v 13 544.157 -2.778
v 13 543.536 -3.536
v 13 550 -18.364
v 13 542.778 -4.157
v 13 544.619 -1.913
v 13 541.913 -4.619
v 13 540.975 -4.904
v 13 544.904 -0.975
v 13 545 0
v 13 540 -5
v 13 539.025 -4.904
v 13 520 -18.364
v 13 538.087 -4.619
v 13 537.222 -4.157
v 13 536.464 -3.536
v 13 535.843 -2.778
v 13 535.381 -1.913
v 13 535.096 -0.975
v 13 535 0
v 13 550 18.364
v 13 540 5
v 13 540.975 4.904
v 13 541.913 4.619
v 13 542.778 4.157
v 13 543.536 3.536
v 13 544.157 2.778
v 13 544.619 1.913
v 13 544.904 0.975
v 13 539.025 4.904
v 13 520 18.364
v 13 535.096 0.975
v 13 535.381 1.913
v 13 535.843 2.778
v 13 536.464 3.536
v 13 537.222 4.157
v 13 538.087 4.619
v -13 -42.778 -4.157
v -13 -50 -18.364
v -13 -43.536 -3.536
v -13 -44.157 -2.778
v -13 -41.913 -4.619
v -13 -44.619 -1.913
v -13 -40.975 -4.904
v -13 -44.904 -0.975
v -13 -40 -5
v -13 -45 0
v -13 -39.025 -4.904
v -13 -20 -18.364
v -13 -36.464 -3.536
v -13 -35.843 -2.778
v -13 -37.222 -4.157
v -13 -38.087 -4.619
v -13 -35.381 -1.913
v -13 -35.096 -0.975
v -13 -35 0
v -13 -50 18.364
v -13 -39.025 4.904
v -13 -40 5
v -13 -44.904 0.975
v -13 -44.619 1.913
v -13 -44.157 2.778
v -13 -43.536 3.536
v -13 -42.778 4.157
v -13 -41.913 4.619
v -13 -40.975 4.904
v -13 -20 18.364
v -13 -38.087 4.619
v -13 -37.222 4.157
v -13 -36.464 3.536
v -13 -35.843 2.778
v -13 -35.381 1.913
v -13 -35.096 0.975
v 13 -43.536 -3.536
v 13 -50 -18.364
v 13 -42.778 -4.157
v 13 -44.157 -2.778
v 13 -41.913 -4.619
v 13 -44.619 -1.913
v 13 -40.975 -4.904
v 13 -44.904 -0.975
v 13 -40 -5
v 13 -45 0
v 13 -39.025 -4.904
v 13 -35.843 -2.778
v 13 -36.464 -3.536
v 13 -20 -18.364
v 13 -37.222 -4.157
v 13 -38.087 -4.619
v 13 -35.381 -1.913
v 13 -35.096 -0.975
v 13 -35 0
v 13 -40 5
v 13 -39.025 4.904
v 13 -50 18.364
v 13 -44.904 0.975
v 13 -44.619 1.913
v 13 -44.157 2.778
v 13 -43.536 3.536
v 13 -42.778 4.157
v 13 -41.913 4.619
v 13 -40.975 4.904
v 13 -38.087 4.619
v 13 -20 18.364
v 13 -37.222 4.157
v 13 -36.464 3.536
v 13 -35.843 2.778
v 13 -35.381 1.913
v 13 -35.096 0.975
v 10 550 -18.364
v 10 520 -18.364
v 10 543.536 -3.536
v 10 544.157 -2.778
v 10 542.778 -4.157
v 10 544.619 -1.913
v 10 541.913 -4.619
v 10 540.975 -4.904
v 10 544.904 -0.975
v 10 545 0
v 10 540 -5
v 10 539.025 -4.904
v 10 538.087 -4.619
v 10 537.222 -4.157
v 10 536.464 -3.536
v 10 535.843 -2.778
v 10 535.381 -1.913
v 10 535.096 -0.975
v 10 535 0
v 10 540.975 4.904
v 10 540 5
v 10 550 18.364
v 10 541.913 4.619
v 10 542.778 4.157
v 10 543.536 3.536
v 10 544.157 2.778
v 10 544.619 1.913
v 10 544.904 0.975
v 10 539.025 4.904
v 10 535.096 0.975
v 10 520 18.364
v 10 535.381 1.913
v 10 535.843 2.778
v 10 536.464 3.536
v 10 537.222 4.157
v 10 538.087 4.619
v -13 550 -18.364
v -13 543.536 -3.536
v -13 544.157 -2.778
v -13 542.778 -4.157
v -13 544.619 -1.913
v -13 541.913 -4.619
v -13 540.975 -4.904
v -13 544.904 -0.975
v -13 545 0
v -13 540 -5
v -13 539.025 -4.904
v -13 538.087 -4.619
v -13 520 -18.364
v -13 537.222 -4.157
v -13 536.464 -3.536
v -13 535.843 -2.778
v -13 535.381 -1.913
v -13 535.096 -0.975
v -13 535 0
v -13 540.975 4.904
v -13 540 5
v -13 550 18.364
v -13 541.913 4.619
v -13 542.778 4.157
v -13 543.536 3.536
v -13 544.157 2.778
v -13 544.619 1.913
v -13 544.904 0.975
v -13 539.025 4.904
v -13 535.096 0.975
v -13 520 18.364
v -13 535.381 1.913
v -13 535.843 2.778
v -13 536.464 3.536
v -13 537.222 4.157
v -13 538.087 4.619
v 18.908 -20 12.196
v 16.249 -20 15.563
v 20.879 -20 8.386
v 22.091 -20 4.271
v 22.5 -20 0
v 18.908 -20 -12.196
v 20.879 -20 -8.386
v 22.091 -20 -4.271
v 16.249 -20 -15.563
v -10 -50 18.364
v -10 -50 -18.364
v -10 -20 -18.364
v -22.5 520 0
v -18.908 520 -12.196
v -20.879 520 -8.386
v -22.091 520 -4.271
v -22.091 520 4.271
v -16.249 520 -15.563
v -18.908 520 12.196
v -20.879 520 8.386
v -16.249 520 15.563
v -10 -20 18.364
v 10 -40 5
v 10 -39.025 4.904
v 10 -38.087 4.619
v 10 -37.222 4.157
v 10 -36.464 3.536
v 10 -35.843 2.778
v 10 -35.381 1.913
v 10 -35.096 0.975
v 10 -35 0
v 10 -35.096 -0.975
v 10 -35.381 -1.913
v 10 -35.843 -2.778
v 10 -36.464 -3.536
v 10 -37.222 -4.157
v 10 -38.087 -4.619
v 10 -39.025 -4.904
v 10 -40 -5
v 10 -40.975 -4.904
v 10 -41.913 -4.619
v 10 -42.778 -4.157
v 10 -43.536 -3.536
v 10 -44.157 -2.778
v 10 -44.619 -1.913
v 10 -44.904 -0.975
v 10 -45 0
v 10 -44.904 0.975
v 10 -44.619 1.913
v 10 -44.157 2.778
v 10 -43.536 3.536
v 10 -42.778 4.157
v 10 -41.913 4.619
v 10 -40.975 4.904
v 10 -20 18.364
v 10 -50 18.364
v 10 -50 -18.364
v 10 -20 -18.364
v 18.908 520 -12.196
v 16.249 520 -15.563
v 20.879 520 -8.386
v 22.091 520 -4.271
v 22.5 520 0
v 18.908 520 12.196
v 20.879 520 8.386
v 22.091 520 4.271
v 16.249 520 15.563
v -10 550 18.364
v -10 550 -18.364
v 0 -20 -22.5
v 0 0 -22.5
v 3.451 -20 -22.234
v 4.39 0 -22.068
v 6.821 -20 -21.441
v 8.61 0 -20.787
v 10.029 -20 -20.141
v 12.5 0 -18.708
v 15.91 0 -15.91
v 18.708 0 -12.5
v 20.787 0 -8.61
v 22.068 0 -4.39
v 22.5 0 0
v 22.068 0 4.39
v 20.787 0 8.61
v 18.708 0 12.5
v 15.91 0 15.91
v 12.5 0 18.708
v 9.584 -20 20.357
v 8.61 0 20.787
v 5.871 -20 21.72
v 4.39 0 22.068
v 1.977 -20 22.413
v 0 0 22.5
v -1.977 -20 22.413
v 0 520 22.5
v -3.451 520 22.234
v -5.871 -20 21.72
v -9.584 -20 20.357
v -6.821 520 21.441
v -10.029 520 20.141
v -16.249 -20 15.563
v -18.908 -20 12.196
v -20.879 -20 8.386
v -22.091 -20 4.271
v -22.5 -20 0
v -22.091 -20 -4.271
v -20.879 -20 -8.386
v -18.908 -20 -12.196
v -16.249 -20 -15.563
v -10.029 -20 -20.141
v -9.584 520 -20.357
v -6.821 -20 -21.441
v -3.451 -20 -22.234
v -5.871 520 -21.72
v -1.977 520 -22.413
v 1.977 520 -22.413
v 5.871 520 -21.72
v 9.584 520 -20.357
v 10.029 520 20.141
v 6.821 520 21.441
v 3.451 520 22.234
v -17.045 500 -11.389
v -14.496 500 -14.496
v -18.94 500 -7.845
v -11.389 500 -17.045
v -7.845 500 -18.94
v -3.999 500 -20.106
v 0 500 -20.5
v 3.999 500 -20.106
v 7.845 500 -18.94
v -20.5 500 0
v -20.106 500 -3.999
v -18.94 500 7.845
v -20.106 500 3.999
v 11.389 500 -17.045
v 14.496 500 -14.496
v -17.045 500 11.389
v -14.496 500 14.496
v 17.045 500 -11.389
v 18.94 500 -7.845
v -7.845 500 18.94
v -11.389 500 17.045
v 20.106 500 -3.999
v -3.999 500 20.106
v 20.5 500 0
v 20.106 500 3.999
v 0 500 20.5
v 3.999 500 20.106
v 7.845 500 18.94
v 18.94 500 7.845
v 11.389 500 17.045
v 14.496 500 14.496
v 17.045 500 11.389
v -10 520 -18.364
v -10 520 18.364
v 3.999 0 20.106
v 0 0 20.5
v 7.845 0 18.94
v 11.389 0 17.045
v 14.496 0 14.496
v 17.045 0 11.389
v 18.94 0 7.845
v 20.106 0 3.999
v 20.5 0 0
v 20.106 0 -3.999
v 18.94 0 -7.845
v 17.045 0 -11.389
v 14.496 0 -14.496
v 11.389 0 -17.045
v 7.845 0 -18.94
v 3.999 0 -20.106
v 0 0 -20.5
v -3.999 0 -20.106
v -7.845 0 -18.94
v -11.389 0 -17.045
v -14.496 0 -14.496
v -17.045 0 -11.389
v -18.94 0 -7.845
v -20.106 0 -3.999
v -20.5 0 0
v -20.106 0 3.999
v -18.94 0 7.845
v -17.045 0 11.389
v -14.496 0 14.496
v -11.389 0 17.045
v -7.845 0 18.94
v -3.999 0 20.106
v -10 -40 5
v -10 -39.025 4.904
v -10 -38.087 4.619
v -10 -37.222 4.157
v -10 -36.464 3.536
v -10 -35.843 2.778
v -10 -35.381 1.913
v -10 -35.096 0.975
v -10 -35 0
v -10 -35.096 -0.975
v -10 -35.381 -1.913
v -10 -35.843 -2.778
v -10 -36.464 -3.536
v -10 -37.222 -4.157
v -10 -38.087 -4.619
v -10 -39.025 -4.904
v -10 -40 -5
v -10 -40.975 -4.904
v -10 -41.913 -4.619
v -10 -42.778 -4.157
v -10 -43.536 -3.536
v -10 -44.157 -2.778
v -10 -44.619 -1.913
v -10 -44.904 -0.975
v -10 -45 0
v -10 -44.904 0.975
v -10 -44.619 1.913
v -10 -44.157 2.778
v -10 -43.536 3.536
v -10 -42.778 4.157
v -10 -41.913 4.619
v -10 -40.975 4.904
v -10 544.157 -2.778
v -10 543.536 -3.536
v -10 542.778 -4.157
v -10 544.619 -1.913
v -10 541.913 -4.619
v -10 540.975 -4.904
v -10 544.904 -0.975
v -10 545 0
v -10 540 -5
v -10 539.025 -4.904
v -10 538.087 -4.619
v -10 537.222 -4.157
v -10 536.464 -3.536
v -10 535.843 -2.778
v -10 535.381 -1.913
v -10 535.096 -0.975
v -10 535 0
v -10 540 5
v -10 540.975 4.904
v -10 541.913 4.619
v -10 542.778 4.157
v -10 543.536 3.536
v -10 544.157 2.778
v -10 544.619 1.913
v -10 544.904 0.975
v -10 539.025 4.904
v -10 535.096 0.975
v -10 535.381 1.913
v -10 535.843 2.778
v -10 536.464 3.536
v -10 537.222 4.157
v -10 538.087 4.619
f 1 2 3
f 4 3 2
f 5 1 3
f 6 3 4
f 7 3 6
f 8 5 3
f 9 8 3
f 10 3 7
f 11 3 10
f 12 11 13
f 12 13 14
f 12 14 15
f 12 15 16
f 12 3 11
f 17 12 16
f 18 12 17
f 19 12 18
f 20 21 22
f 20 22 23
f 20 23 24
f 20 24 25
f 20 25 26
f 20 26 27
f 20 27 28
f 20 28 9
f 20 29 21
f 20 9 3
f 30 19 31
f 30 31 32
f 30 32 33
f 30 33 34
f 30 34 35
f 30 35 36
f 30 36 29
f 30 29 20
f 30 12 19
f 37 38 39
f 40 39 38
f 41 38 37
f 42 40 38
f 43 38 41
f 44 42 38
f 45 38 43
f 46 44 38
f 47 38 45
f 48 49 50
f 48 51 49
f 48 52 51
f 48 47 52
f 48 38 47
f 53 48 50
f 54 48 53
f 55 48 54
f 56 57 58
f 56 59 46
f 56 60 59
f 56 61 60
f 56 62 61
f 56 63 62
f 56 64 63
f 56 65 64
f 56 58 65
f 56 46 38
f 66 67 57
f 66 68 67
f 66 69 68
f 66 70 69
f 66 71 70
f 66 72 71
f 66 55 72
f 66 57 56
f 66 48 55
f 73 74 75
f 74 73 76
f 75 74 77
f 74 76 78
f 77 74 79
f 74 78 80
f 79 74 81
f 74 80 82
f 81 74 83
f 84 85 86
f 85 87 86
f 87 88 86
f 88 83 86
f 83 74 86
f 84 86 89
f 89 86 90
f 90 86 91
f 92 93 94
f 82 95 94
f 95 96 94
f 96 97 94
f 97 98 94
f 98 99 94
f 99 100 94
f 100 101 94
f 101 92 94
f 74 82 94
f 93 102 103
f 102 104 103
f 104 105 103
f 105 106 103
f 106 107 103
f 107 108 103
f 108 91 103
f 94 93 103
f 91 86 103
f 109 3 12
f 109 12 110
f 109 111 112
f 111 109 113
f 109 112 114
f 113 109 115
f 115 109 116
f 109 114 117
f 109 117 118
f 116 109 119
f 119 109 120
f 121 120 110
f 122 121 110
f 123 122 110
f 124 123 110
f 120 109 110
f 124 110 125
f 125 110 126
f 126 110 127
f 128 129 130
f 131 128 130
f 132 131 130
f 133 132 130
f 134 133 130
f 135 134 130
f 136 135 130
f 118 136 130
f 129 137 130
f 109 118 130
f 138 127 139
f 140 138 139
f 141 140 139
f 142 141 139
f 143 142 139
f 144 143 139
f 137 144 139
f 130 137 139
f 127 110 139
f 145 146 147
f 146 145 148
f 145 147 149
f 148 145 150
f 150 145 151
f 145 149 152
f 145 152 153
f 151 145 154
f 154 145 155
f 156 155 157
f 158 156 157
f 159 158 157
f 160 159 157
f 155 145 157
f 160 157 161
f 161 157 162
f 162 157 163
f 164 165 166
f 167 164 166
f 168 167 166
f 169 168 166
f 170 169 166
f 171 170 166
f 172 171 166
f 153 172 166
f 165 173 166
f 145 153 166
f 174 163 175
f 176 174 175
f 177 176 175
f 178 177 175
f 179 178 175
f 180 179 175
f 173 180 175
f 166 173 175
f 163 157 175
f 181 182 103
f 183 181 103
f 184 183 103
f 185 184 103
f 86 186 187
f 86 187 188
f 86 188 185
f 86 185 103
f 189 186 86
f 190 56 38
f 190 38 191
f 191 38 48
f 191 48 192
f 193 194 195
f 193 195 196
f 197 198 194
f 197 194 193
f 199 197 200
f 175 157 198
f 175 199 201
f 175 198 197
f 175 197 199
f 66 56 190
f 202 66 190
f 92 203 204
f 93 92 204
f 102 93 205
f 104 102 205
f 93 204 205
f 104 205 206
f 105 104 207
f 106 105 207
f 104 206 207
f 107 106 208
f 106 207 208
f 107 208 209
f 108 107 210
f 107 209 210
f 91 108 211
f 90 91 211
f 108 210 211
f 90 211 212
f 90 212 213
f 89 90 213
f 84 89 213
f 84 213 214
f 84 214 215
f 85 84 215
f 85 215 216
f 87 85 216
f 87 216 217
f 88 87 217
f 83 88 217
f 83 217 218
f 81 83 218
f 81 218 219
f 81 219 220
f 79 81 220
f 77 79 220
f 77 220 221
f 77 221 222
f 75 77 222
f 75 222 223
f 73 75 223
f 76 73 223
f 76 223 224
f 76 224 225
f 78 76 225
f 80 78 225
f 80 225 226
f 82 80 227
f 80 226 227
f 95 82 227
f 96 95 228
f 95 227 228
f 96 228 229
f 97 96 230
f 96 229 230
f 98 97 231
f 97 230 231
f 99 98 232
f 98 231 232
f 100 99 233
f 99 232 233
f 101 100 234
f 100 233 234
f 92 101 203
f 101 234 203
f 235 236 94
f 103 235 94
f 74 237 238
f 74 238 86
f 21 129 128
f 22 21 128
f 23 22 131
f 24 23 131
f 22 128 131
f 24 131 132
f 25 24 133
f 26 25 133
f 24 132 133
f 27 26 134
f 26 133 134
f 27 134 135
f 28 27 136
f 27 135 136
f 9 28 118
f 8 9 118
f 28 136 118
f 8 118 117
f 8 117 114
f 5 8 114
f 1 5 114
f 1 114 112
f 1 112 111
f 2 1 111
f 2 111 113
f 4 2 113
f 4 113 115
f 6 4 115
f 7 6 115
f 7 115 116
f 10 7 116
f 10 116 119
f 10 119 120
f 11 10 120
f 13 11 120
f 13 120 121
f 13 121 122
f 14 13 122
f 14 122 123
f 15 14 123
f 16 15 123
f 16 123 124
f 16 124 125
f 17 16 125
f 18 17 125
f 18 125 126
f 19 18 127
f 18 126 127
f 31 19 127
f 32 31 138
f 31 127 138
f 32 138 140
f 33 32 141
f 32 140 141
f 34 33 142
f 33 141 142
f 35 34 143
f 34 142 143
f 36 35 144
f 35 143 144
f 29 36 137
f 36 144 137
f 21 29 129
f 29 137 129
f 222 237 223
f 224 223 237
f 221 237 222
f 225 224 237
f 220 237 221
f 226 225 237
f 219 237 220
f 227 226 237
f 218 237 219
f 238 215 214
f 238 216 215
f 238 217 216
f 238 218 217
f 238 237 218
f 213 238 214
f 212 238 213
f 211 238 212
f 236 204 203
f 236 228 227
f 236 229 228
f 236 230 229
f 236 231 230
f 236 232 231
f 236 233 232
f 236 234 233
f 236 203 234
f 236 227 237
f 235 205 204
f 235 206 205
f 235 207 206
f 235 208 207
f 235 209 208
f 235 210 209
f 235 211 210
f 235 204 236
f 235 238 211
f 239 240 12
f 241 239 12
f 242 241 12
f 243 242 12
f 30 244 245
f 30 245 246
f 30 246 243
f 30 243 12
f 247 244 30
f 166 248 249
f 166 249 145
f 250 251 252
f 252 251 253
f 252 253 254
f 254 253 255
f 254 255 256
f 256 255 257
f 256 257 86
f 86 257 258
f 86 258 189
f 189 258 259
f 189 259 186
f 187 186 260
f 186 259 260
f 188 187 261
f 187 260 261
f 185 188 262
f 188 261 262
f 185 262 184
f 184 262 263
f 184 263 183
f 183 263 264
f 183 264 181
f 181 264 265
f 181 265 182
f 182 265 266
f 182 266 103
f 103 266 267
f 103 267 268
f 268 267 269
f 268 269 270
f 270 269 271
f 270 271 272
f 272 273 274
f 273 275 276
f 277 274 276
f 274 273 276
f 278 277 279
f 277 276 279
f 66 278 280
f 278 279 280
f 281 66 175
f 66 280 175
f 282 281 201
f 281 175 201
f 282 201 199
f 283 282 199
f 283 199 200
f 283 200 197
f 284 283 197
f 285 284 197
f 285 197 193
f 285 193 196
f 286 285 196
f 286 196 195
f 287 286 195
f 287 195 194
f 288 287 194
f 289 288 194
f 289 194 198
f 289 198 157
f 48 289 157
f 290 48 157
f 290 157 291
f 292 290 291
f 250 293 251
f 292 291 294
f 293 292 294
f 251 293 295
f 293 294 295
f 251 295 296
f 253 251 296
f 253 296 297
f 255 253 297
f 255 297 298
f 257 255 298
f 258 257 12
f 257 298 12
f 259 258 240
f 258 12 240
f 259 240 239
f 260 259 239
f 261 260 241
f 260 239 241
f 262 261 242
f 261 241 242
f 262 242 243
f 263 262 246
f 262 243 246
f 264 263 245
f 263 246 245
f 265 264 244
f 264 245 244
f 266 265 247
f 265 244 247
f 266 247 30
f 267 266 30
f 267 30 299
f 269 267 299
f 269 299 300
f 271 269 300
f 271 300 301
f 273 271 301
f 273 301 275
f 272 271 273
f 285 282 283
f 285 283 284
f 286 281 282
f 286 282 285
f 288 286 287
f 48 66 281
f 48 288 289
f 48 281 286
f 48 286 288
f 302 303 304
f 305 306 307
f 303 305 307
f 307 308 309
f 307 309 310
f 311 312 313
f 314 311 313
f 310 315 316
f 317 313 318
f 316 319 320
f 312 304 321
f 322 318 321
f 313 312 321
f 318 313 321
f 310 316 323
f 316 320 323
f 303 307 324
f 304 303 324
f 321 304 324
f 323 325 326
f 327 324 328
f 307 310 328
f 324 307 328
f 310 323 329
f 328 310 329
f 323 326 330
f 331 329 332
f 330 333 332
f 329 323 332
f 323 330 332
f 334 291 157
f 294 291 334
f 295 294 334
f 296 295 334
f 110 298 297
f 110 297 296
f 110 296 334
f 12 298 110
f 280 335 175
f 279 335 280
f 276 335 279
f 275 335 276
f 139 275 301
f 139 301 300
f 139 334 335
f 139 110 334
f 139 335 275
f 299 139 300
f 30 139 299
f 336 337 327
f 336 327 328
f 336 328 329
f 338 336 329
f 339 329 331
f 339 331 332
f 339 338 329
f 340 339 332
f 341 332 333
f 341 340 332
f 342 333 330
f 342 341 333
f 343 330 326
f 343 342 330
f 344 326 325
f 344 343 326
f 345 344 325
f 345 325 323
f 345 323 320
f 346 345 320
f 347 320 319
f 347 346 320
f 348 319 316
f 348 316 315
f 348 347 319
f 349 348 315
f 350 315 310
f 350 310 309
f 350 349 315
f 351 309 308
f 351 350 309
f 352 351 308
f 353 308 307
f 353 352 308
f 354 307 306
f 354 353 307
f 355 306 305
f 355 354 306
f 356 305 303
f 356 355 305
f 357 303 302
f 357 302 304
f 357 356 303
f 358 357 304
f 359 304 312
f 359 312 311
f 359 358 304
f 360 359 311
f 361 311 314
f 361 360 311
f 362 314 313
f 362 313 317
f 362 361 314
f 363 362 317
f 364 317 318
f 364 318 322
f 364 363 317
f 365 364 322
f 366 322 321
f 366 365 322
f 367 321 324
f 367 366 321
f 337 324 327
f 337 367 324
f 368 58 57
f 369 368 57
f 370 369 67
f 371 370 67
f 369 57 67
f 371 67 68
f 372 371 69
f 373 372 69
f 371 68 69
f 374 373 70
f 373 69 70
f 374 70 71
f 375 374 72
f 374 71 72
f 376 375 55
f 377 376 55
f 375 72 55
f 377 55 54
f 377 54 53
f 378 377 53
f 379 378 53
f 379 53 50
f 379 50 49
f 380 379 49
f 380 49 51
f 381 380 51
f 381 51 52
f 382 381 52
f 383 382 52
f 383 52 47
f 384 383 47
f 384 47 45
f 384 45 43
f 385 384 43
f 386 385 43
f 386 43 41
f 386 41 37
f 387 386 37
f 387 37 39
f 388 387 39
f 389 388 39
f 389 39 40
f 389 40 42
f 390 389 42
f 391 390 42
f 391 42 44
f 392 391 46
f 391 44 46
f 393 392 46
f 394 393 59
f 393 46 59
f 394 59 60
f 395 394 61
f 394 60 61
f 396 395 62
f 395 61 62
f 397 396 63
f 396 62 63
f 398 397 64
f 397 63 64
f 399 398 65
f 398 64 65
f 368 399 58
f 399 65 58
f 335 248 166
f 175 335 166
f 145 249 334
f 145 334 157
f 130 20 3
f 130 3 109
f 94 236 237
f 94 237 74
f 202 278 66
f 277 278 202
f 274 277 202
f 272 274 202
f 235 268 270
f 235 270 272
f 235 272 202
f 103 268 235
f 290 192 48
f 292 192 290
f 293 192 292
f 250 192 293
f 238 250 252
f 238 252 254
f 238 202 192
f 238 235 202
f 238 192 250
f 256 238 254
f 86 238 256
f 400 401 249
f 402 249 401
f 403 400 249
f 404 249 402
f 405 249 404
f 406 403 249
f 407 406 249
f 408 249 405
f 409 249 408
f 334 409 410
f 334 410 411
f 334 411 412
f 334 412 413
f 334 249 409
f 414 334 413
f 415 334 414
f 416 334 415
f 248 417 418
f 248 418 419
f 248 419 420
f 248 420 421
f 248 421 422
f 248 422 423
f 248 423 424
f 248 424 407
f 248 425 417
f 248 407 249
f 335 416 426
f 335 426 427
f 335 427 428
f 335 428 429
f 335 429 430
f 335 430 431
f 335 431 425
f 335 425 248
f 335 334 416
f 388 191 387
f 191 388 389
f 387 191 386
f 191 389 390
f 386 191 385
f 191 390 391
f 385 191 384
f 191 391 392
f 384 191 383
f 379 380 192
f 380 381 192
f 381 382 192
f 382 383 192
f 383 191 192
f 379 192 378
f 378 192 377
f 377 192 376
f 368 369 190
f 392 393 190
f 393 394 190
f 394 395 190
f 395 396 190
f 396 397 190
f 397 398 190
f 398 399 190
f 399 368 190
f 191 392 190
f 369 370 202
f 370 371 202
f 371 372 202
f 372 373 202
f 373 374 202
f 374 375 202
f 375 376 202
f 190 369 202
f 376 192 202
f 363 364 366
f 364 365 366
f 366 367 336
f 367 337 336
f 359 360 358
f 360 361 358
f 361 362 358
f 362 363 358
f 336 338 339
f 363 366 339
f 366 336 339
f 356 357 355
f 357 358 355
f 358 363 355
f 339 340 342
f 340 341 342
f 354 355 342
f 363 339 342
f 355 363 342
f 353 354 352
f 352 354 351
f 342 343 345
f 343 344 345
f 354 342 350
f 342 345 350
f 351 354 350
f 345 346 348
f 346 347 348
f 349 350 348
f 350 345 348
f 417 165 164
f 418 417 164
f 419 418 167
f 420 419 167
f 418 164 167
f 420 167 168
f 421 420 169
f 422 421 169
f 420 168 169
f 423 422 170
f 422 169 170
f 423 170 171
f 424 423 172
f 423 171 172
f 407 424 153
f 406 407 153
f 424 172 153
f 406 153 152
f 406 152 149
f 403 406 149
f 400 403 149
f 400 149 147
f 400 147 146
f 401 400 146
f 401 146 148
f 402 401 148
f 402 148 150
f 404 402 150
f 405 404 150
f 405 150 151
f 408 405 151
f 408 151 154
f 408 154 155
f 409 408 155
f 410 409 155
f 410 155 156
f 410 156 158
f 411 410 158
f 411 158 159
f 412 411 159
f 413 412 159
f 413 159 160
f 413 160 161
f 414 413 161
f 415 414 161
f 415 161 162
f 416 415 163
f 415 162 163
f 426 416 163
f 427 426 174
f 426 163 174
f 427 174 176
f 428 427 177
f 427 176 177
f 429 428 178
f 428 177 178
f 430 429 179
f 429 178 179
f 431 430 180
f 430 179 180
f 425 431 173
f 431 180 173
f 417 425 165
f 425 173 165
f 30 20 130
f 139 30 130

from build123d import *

# Parameters (mm, degrees)
SKETCH1_R               = 22.5
SKETCH1_R_2             = 20.5
EXTRUDE1_DEPTH          = 500
SKETCH2_R               = 22.5
EXTRUDE2_DEPTH          = 20
SKETCH3_R               = 22.5
EXTRUDE3_DEPTH          = 20
SKETCH5_W               = 3
SKETCH5_H               = 36.728735344
EXTRUDE4_DEPTH          = 30
SKETCH7_W               = 3
SKETCH7_H               = 36.728735344
EXTRUDE6_DEPTH          = 30
SKETCH8_R               = 5
CUT_EXTRUDE1_DEPTH      = 10.5
CUT_EXTRUDE1_DEPTH_BACK = 36.5
SKETCH9_R               = 5
CUT_EXTRUDE2_DEPTH      = 10.5
CUT_EXTRUDE2_DEPTH_BACK = 36.5


with BuildPart() as part:
    # Sketch1 → Extrude1 (new body)
    with BuildSketch(Plane(origin=(0, 0, 0), x_dir=(1, 0, 0), z_dir=(0, 1, 0))):
        with Locations(Location((0, 0, 0), (0, 0, 270))):  # turned: the seam where the file's is
            Circle(SKETCH1_R)
        with Locations(Location((0, 0, 0), (0, 0, 270))):  # turned: the seam where the file's is
            Circle(SKETCH1_R_2, mode=Mode.SUBTRACT)
    extrude(amount=EXTRUDE1_DEPTH)

    # Sketch2 → Extrude2 (add)
    with BuildSketch(Plane(origin=(0, 500, 0), x_dir=(-1, 0, 0), z_dir=(0, 1, 0))):
        with Locations(Location((0, 0, 0), (0, 0, 90))):  # turned: the seam where the file's is
            Circle(SKETCH2_R)
    extrude(amount=EXTRUDE2_DEPTH)

    # Sketch3 → Extrude3 (add)
    with BuildSketch(Plane.XZ):
        with Locations(Location((0, 0, 0), (0, 0, 270))):  # turned: the seam where the file's is
            Circle(SKETCH3_R)
    extrude(amount=EXTRUDE3_DEPTH)

    # Sketch5 → Extrude4 (add)
    with BuildSketch(Plane.XZ.offset(20)):
        with Locations((-11.5, 0)):
            Rectangle(SKETCH5_W, SKETCH5_H)
        with Locations((11.5, 0)):
            Rectangle(SKETCH5_W, SKETCH5_H)
    extrude(amount=EXTRUDE4_DEPTH)

    # Sketch7 → Extrude6 (add)
    with BuildSketch(Plane(origin=(0, 520, 0), x_dir=(-1, 0, 0), z_dir=(0, 1, 0))):
        with Locations((-11.5, 0)):
            Rectangle(SKETCH7_W, SKETCH7_H)
        with Locations((11.5, 0)):
            Rectangle(SKETCH7_W, SKETCH7_H)
    extrude(amount=EXTRUDE6_DEPTH)

    # Sketch8 → Cut-Extrude1 (cut, two sides)
    with BuildSketch(Plane.ZY.offset(13)) as cut_extrude1_sk:
        with Locations((0, 540)):
            Circle(SKETCH8_R)
    extrude(amount=CUT_EXTRUDE1_DEPTH, mode=Mode.SUBTRACT)
    extrude(cut_extrude1_sk.sketch, amount=-CUT_EXTRUDE1_DEPTH_BACK, mode=Mode.SUBTRACT)

    # Sketch9 → Cut-Extrude2 (cut, two sides)
    with BuildSketch(Plane.ZY.offset(13)) as cut_extrude2_sk:
        with Locations((0, -40)):
            Circle(SKETCH9_R)
    extrude(amount=CUT_EXTRUDE2_DEPTH, mode=Mode.SUBTRACT)
    extrude(cut_extrude2_sk.sketch, amount=-CUT_EXTRUDE2_DEPTH_BACK, mode=Mode.SUBTRACT)


solid = part.part
